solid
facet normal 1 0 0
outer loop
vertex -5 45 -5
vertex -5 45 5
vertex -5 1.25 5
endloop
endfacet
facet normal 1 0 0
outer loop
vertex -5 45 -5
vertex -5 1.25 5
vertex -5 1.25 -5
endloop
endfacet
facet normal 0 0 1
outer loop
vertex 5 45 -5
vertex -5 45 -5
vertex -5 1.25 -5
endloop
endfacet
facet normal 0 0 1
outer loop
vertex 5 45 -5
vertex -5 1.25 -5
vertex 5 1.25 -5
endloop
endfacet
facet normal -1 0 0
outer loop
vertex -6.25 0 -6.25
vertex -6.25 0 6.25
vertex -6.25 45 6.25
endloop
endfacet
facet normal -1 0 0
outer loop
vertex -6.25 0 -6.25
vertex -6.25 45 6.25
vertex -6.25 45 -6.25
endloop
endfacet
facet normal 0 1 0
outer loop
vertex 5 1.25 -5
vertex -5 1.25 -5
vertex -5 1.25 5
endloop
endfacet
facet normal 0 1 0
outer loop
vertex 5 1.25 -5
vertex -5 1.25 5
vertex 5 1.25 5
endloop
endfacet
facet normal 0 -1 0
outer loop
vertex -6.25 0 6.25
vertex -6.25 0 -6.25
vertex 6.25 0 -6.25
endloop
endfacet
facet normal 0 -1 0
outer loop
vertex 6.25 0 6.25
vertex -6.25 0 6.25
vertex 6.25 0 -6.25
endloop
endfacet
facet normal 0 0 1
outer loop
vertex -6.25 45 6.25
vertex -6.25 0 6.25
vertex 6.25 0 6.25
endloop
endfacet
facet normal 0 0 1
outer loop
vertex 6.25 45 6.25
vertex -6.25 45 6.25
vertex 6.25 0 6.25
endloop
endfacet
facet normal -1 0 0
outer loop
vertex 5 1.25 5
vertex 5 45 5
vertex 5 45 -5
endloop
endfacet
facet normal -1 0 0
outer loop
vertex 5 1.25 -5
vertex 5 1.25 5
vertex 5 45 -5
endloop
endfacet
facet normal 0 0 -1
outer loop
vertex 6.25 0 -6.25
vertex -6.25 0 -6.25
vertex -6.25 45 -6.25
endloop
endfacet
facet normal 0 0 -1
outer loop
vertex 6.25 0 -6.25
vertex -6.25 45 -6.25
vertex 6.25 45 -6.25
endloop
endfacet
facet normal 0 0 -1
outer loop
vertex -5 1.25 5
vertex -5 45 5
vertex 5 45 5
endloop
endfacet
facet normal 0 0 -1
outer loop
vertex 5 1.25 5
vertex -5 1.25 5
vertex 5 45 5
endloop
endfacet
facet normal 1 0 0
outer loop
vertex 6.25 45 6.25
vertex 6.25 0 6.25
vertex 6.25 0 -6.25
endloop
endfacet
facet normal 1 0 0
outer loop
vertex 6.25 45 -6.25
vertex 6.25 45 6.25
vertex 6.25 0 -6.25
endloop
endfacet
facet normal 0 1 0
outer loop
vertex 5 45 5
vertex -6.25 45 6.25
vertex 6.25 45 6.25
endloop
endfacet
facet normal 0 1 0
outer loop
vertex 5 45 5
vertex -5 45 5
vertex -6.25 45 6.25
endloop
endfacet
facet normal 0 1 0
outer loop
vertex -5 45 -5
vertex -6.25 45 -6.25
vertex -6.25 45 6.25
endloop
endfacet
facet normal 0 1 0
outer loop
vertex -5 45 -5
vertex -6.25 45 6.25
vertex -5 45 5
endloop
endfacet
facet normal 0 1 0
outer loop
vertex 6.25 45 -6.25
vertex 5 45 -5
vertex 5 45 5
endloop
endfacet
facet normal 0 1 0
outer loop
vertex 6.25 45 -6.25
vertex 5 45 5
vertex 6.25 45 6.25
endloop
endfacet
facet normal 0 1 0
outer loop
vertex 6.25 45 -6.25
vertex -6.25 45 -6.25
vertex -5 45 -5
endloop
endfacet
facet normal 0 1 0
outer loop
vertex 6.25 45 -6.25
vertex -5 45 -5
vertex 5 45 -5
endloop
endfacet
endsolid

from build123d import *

# Parameters (mm, degrees)
SKETCH1_W          = 12.5
SKETCH1_H          = 12.5
CUVETTE_BODY_DEPTH = 45
SAMPLE_SPACE_START = 45
SKETCH2_W          = 10
SKETCH2_H          = 10
SAMPLE_SPACE_DEPTH = 43.75


with BuildPart() as part:
    # Sketch1 → Cuvette_Body (new body)
    with BuildSketch(Plane(origin=(0, 0, 0), x_dir=(1, 0, 0), z_dir=(0, 1, 0))):
        Rectangle(SKETCH1_W, SKETCH1_H)
    extrude(amount=CUVETTE_BODY_DEPTH)

    # Sketch2 → Sample_Space (cut)
    with BuildSketch(Plane(origin=(0, 0, 0), x_dir=(1, 0, 0), z_dir=(0, 1, 0)).offset(SAMPLE_SPACE_START)):
        Rectangle(SKETCH2_W, SKETCH2_H)
    extrude(amount=-SAMPLE_SPACE_DEPTH, mode=Mode.SUBTRACT)


solid = part.part
